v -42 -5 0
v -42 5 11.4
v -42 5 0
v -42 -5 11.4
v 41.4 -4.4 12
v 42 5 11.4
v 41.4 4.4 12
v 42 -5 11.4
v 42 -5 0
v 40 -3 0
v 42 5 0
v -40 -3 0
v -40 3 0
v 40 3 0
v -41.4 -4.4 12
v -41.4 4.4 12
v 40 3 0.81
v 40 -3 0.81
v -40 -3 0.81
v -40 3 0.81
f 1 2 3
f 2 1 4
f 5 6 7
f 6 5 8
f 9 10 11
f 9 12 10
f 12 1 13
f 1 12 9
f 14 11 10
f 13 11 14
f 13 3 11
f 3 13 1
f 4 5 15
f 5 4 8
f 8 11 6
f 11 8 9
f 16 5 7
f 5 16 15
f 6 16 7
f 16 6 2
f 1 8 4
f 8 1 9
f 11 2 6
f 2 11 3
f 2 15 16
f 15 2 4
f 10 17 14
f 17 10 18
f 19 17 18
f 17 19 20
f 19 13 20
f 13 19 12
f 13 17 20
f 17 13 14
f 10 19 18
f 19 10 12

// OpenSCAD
// Bond-optimized rib with glue channels & small bevel.
//
// Base dimensions: 84 x 10 x 12

$fn = 80;  // smoothness

// ---------- Parameters ----------
Rib_Length = 84;
Rib_Width = 10;
Rib_Height = 12;
Top_Bevel = 0.6;

module rib_bonded(x=Rib_Length, y=Rib_Width, z=Rib_Height) {
  difference() {
    // Main body with a small bevel (cheap chamfer using hull trick)
    // If you want absolute rectangular, set Top_Bevel=0 and simplify.
    if (Top_Bevel > 0) {
      hull() {
        translate([-x/2, -y/2, 0]) cube([x, y, z - Top_Bevel]);
        translate([-(x-2*Top_Bevel)/2, -(y-2*Top_Bevel)/2, z - Top_Bevel])
          cube([x-2*Top_Bevel, y-2*Top_Bevel, Top_Bevel]);
      }
    } else {
      translate([-x/2, -y/2, 0]) cube([x, y, z]);
    }

    // Underside glue channels (cut into the bottom face)
    y_pos = -y/2 + 2 + 0.5*(y - 2*2);
    channel_w = Rib_Width - 4;
    
    translate([-x/2 + 2, y_pos - channel_w/2, -0.01])
      cube([x - 2*2, channel_w, 0.8 + 0.02], center=false);
    
  }
}

rib_bonded();
